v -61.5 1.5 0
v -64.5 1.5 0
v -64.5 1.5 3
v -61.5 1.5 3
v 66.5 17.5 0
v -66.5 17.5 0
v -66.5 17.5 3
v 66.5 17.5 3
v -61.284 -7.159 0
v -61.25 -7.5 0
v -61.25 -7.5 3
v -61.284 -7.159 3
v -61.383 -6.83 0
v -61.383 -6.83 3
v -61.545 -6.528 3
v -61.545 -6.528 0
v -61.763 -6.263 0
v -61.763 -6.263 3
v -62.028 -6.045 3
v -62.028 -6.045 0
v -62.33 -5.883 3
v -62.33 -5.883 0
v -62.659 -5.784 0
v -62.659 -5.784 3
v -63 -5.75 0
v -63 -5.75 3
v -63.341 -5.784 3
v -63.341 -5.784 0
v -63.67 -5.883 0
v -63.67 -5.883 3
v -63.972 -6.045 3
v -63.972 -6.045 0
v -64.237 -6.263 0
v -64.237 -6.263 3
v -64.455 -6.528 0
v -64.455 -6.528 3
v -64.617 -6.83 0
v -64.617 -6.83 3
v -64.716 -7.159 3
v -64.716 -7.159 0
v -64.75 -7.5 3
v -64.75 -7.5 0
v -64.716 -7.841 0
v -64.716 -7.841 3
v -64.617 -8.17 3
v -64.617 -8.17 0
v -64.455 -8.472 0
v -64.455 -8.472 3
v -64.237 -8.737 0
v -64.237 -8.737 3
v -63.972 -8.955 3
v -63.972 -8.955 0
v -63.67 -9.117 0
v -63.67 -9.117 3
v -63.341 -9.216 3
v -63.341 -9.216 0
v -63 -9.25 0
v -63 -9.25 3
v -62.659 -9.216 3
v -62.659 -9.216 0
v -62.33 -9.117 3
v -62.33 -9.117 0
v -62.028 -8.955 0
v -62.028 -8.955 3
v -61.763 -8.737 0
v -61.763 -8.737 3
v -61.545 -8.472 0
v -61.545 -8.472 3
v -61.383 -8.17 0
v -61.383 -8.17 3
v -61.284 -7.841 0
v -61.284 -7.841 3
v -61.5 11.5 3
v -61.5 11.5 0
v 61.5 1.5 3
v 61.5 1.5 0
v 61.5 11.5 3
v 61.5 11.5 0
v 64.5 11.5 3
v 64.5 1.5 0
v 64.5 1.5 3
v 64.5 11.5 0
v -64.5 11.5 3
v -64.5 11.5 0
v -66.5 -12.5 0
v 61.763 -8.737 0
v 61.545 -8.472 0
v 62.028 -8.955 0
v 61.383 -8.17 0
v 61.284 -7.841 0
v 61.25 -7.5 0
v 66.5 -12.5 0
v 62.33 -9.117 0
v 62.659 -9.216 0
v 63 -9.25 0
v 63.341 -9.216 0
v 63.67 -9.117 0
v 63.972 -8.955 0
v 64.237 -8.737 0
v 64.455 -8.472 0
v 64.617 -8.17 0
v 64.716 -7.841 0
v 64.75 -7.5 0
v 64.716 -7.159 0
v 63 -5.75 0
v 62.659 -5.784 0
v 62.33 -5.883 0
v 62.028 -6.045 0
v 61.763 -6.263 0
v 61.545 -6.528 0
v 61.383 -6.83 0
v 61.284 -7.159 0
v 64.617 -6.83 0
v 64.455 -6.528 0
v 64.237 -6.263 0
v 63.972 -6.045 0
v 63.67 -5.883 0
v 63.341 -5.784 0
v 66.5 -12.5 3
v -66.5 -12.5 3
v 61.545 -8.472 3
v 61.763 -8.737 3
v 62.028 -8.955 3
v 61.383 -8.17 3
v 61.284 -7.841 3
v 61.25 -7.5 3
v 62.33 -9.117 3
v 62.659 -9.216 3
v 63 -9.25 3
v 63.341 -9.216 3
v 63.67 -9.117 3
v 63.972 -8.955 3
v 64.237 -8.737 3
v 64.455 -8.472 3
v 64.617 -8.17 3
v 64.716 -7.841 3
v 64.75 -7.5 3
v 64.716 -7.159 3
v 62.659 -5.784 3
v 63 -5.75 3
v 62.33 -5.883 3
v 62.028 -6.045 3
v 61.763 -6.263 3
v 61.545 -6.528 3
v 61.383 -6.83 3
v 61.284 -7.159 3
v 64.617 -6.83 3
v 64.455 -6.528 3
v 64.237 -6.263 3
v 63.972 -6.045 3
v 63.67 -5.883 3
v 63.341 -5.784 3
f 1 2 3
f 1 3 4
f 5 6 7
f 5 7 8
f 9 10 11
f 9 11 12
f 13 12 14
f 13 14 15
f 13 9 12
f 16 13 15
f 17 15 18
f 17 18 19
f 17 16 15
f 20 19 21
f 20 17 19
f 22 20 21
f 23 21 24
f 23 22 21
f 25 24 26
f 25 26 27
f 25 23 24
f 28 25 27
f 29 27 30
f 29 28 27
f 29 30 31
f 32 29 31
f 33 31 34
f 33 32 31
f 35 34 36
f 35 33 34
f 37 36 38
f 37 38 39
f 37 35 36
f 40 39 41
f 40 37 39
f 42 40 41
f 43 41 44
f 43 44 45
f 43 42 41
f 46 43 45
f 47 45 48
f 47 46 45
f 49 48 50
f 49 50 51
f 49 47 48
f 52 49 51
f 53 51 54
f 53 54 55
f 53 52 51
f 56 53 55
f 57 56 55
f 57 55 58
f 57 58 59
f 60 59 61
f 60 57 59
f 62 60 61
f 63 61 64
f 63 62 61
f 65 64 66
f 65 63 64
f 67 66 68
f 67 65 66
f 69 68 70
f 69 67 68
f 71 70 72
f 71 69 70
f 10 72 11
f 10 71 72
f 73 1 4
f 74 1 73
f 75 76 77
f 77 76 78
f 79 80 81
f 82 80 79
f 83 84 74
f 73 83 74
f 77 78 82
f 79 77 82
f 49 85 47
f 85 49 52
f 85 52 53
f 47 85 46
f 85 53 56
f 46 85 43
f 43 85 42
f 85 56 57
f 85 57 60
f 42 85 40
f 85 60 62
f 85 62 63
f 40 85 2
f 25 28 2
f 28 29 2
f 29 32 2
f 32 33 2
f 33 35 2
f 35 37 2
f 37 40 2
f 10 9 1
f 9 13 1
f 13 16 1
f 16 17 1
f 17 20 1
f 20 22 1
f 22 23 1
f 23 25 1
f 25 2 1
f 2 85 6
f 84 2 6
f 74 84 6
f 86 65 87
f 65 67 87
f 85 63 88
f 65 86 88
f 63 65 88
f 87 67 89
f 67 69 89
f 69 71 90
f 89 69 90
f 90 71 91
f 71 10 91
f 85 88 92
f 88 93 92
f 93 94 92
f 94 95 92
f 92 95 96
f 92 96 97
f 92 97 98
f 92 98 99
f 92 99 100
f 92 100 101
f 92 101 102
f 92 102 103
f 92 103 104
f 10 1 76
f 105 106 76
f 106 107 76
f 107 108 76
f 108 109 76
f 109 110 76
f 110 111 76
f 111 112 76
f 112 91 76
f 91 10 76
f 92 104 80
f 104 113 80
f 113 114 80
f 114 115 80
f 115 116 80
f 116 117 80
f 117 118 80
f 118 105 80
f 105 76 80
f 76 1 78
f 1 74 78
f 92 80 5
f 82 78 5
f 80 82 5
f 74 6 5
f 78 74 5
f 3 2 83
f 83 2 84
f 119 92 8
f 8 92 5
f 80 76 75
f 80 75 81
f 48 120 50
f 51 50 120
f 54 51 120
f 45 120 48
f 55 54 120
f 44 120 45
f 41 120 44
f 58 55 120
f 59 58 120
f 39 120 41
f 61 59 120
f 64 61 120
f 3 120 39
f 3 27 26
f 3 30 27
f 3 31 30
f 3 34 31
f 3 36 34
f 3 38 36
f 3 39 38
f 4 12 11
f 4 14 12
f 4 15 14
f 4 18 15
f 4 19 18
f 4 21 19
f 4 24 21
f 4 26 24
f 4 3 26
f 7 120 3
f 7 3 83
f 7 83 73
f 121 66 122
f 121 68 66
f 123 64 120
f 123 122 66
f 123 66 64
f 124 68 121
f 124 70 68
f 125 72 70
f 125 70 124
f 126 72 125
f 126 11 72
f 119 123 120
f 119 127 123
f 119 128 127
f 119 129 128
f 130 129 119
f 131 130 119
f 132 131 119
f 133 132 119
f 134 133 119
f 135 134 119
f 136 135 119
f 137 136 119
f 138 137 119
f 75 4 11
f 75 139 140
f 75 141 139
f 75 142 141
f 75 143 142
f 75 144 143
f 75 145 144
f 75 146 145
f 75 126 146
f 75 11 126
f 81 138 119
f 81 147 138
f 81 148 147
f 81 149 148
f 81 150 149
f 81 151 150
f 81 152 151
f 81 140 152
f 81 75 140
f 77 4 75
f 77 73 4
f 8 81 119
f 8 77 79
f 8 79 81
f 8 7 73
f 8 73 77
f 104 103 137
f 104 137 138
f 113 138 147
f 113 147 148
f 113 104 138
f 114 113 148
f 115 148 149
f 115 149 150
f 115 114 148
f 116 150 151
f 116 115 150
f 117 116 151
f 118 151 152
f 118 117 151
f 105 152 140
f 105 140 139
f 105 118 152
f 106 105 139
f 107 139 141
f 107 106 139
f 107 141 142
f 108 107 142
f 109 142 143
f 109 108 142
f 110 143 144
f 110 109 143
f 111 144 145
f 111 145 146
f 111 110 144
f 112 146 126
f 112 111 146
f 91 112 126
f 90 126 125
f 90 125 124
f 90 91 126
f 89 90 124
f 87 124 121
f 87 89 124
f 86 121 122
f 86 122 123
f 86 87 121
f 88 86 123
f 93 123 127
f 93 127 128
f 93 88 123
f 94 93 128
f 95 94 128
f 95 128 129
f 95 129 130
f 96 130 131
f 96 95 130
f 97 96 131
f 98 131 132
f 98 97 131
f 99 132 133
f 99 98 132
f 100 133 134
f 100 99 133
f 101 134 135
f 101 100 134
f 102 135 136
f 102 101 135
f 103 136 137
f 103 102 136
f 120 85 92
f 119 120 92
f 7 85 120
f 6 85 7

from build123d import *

# Parameters (mm, degrees)
SKETCH1_W           = 133
SKETCH1_H           = 30
SKETCH1_R           = 1.75
SKETCH1_W_2         = 3
SKETCH1_H_2         = 10
BOSS_EXTRUDE1_DEPTH = 3


with BuildPart() as part:
    # Sketch1 → Boss-Extrude1 (new body)
    with BuildSketch(Plane.XY):
        with Locations((0, 2.5)):
            Rectangle(SKETCH1_W, SKETCH1_H)
        with Locations((-63, -7.5)):
            Circle(SKETCH1_R, mode=Mode.SUBTRACT)
        with Locations((63, -7.5)):
            Circle(SKETCH1_R, mode=Mode.SUBTRACT)
        with Locations((63, 6.5)):
            Rectangle(SKETCH1_W_2, SKETCH1_H_2, mode=Mode.SUBTRACT)
        with Locations((-63, 6.5)):
            Rectangle(SKETCH1_W_2, SKETCH1_H_2, mode=Mode.SUBTRACT)
    extrude(amount=BOSS_EXTRUDE1_DEPTH)


solid = part.part
